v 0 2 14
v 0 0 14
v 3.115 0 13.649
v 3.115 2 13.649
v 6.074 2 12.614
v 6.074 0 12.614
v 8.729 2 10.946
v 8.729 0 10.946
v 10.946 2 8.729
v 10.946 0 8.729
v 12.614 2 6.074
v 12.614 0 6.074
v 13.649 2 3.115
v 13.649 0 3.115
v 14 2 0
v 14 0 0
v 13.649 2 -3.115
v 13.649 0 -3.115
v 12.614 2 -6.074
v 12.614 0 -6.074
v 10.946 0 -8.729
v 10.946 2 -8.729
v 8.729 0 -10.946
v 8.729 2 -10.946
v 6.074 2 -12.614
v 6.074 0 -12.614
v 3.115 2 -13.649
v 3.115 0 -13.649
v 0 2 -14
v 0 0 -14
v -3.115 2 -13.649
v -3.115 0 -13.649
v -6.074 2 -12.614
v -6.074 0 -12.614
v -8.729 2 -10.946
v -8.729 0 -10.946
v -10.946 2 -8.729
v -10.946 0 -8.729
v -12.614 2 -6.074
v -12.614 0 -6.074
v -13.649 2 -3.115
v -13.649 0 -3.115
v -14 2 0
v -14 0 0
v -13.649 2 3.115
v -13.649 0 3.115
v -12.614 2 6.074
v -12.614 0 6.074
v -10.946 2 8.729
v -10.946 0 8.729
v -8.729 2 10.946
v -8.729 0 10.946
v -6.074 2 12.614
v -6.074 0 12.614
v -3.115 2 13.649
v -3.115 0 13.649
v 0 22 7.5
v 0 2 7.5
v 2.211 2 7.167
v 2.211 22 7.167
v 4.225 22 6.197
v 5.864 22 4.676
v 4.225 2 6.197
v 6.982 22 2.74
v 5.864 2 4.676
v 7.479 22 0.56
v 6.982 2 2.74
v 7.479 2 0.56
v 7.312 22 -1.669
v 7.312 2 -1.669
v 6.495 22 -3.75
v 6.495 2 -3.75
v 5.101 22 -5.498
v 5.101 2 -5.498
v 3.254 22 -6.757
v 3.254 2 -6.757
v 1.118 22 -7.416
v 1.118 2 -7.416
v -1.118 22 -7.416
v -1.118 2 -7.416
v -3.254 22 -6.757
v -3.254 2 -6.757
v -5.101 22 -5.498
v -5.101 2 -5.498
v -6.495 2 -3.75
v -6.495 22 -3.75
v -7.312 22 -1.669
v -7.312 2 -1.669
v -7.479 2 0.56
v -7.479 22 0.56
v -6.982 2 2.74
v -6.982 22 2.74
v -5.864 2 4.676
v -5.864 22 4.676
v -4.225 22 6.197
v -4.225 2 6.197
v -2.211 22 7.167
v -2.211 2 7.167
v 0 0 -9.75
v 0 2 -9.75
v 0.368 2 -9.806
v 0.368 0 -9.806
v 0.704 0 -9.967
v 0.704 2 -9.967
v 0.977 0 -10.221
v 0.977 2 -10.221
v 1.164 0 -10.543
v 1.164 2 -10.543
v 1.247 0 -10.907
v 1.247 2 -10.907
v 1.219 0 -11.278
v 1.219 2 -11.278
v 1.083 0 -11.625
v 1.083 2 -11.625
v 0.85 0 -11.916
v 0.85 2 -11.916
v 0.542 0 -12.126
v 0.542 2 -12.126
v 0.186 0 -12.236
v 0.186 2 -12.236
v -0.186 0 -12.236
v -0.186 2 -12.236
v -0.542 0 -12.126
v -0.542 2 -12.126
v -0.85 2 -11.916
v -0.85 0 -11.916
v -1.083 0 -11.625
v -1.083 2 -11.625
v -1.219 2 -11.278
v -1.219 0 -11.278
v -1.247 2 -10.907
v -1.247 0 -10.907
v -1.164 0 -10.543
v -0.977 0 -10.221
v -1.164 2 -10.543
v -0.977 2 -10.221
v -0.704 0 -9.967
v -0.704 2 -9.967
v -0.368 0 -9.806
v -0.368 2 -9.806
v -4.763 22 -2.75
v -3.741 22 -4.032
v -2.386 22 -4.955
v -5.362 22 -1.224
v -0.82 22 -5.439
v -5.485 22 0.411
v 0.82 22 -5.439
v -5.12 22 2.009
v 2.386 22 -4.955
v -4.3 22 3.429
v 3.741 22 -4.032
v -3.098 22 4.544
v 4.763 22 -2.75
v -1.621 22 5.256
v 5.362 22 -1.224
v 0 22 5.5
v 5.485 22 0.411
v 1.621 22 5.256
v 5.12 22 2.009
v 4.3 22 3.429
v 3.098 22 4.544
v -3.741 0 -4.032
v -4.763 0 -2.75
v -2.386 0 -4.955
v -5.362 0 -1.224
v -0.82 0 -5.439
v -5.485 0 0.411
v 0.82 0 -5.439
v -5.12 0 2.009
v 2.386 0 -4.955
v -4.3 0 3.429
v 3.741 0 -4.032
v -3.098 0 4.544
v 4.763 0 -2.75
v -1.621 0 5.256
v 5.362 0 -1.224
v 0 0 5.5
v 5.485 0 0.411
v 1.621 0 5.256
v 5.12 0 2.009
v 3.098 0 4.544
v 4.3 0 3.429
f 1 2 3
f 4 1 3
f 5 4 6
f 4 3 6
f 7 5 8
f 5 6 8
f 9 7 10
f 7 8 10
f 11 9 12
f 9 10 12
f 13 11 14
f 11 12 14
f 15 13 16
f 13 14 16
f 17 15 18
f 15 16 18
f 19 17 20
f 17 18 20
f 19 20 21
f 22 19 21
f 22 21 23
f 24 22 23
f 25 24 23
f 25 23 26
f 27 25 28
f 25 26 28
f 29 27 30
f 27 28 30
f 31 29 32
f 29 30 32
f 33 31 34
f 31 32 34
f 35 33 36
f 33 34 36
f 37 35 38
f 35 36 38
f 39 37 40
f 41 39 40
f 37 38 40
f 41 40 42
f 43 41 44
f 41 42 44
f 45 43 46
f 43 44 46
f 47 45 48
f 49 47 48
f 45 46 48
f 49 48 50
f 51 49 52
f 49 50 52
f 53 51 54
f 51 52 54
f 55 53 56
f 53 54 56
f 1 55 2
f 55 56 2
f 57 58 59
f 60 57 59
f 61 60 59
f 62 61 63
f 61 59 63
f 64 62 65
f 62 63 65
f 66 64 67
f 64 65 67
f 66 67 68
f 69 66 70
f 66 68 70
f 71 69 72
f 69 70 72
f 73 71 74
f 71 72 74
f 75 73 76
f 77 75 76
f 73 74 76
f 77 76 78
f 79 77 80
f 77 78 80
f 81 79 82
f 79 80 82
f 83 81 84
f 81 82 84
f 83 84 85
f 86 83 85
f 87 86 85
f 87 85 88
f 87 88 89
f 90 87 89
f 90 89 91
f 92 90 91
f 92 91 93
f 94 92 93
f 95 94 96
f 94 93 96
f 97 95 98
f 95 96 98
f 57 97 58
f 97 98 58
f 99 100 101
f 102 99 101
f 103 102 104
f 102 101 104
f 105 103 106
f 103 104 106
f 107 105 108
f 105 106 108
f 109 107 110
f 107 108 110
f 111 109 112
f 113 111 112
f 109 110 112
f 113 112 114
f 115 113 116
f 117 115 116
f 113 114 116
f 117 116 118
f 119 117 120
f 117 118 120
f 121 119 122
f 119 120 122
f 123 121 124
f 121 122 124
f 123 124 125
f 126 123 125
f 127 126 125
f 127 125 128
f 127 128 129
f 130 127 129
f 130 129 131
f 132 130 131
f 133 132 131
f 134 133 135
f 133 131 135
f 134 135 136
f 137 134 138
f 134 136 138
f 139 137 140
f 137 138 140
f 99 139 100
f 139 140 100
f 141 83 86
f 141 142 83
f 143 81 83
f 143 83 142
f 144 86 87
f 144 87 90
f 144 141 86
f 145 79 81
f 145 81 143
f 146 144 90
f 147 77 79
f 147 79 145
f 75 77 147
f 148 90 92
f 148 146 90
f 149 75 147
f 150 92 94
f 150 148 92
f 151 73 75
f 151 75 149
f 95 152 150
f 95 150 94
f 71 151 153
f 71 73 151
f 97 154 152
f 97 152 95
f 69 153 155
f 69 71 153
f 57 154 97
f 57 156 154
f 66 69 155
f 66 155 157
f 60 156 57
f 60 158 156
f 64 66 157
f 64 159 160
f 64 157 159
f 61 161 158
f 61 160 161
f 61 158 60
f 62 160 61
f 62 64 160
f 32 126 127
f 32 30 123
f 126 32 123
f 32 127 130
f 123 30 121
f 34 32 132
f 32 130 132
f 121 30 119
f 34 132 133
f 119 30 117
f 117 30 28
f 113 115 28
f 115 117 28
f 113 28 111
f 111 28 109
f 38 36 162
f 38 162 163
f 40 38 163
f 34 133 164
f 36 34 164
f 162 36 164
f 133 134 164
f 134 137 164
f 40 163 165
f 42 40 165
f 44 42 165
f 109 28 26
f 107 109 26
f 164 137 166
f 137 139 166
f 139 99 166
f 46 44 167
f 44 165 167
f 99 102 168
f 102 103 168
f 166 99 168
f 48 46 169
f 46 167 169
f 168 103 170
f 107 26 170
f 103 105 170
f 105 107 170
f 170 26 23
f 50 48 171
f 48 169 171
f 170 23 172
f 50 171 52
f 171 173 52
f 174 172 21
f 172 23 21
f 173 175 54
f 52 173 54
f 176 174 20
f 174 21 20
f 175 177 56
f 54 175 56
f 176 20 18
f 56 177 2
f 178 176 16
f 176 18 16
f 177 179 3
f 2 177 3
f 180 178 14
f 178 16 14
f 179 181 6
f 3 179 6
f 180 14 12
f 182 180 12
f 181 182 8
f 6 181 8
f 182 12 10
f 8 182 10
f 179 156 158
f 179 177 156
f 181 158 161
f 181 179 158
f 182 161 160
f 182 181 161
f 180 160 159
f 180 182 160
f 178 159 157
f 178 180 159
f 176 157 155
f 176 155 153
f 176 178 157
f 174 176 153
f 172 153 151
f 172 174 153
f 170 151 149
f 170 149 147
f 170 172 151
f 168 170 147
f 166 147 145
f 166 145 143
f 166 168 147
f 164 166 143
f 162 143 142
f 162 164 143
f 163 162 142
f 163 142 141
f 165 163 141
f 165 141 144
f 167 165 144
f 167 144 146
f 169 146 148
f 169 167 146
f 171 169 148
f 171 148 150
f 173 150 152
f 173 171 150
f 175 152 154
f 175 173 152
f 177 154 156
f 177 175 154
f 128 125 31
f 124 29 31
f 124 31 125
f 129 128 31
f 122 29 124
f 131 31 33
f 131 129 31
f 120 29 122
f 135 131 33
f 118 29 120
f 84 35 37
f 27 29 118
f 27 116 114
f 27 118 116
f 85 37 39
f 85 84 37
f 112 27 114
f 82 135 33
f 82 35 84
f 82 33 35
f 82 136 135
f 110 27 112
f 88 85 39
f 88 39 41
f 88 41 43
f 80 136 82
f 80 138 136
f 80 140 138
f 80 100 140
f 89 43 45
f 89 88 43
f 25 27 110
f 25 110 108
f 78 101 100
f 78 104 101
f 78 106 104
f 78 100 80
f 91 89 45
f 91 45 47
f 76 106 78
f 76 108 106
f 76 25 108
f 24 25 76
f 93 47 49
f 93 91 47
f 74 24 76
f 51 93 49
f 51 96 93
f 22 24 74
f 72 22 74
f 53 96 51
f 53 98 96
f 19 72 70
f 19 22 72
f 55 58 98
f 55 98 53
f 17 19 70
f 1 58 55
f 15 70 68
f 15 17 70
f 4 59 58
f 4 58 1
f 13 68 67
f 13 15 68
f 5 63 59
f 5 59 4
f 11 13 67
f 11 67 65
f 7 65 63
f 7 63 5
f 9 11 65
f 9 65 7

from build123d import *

# Parameters (mm, degrees)
SKETCH1_R           = 14
SKETCH1_R_2         = 5.5
BOSS_EXTRUDE1_DEPTH = 2
SKETCH2_R           = 1.25
CUT_EXTRUDE1_DEPTH  = 2
SKETCH3_R           = 7.5
SKETCH3_R_2         = 5.5
BOSS_EXTRUDE2_DEPTH = 20


with BuildPart() as part:
    # Sketch1 → Boss-Extrude1 (new body)
    with BuildSketch(Plane(origin=(0, 0, 0), x_dir=(1, 0, 0), z_dir=(0, 1, 0))):
        with Locations(Location((0, 0, 0), (0, 0, 270))):
            Circle(SKETCH1_R)
        with Locations(Location((0, 0, 0), (0, 0, 270))):
            Circle(SKETCH1_R_2, mode=Mode.SUBTRACT)
    extrude(amount=BOSS_EXTRUDE1_DEPTH)

    # Sketch2 → Cut-Extrude1 (cut)
    with BuildSketch(Plane(origin=(0, 2, 0), x_dir=(1, 0, 0), z_dir=(0, 1, 0))):
        with Locations(Location((0, 11, 0), (0, 0, 270))):
            Circle(SKETCH2_R)
    extrude(amount=-CUT_EXTRUDE1_DEPTH, mode=Mode.SUBTRACT)

    # Sketch3 → Boss-Extrude2 (add)
    with BuildSketch(Plane(origin=(0, 2, 0), x_dir=(1, 0, 0), z_dir=(0, 1, 0))):
        with Locations(Location((0, 0, 0), (0, 0, 270))):
            Circle(SKETCH3_R)
        with Locations(Location((0, 0, 0), (0, 0, 270))):
            Circle(SKETCH3_R_2, mode=Mode.SUBTRACT)
    extrude(amount=BOSS_EXTRUDE2_DEPTH)


solid = part.part
